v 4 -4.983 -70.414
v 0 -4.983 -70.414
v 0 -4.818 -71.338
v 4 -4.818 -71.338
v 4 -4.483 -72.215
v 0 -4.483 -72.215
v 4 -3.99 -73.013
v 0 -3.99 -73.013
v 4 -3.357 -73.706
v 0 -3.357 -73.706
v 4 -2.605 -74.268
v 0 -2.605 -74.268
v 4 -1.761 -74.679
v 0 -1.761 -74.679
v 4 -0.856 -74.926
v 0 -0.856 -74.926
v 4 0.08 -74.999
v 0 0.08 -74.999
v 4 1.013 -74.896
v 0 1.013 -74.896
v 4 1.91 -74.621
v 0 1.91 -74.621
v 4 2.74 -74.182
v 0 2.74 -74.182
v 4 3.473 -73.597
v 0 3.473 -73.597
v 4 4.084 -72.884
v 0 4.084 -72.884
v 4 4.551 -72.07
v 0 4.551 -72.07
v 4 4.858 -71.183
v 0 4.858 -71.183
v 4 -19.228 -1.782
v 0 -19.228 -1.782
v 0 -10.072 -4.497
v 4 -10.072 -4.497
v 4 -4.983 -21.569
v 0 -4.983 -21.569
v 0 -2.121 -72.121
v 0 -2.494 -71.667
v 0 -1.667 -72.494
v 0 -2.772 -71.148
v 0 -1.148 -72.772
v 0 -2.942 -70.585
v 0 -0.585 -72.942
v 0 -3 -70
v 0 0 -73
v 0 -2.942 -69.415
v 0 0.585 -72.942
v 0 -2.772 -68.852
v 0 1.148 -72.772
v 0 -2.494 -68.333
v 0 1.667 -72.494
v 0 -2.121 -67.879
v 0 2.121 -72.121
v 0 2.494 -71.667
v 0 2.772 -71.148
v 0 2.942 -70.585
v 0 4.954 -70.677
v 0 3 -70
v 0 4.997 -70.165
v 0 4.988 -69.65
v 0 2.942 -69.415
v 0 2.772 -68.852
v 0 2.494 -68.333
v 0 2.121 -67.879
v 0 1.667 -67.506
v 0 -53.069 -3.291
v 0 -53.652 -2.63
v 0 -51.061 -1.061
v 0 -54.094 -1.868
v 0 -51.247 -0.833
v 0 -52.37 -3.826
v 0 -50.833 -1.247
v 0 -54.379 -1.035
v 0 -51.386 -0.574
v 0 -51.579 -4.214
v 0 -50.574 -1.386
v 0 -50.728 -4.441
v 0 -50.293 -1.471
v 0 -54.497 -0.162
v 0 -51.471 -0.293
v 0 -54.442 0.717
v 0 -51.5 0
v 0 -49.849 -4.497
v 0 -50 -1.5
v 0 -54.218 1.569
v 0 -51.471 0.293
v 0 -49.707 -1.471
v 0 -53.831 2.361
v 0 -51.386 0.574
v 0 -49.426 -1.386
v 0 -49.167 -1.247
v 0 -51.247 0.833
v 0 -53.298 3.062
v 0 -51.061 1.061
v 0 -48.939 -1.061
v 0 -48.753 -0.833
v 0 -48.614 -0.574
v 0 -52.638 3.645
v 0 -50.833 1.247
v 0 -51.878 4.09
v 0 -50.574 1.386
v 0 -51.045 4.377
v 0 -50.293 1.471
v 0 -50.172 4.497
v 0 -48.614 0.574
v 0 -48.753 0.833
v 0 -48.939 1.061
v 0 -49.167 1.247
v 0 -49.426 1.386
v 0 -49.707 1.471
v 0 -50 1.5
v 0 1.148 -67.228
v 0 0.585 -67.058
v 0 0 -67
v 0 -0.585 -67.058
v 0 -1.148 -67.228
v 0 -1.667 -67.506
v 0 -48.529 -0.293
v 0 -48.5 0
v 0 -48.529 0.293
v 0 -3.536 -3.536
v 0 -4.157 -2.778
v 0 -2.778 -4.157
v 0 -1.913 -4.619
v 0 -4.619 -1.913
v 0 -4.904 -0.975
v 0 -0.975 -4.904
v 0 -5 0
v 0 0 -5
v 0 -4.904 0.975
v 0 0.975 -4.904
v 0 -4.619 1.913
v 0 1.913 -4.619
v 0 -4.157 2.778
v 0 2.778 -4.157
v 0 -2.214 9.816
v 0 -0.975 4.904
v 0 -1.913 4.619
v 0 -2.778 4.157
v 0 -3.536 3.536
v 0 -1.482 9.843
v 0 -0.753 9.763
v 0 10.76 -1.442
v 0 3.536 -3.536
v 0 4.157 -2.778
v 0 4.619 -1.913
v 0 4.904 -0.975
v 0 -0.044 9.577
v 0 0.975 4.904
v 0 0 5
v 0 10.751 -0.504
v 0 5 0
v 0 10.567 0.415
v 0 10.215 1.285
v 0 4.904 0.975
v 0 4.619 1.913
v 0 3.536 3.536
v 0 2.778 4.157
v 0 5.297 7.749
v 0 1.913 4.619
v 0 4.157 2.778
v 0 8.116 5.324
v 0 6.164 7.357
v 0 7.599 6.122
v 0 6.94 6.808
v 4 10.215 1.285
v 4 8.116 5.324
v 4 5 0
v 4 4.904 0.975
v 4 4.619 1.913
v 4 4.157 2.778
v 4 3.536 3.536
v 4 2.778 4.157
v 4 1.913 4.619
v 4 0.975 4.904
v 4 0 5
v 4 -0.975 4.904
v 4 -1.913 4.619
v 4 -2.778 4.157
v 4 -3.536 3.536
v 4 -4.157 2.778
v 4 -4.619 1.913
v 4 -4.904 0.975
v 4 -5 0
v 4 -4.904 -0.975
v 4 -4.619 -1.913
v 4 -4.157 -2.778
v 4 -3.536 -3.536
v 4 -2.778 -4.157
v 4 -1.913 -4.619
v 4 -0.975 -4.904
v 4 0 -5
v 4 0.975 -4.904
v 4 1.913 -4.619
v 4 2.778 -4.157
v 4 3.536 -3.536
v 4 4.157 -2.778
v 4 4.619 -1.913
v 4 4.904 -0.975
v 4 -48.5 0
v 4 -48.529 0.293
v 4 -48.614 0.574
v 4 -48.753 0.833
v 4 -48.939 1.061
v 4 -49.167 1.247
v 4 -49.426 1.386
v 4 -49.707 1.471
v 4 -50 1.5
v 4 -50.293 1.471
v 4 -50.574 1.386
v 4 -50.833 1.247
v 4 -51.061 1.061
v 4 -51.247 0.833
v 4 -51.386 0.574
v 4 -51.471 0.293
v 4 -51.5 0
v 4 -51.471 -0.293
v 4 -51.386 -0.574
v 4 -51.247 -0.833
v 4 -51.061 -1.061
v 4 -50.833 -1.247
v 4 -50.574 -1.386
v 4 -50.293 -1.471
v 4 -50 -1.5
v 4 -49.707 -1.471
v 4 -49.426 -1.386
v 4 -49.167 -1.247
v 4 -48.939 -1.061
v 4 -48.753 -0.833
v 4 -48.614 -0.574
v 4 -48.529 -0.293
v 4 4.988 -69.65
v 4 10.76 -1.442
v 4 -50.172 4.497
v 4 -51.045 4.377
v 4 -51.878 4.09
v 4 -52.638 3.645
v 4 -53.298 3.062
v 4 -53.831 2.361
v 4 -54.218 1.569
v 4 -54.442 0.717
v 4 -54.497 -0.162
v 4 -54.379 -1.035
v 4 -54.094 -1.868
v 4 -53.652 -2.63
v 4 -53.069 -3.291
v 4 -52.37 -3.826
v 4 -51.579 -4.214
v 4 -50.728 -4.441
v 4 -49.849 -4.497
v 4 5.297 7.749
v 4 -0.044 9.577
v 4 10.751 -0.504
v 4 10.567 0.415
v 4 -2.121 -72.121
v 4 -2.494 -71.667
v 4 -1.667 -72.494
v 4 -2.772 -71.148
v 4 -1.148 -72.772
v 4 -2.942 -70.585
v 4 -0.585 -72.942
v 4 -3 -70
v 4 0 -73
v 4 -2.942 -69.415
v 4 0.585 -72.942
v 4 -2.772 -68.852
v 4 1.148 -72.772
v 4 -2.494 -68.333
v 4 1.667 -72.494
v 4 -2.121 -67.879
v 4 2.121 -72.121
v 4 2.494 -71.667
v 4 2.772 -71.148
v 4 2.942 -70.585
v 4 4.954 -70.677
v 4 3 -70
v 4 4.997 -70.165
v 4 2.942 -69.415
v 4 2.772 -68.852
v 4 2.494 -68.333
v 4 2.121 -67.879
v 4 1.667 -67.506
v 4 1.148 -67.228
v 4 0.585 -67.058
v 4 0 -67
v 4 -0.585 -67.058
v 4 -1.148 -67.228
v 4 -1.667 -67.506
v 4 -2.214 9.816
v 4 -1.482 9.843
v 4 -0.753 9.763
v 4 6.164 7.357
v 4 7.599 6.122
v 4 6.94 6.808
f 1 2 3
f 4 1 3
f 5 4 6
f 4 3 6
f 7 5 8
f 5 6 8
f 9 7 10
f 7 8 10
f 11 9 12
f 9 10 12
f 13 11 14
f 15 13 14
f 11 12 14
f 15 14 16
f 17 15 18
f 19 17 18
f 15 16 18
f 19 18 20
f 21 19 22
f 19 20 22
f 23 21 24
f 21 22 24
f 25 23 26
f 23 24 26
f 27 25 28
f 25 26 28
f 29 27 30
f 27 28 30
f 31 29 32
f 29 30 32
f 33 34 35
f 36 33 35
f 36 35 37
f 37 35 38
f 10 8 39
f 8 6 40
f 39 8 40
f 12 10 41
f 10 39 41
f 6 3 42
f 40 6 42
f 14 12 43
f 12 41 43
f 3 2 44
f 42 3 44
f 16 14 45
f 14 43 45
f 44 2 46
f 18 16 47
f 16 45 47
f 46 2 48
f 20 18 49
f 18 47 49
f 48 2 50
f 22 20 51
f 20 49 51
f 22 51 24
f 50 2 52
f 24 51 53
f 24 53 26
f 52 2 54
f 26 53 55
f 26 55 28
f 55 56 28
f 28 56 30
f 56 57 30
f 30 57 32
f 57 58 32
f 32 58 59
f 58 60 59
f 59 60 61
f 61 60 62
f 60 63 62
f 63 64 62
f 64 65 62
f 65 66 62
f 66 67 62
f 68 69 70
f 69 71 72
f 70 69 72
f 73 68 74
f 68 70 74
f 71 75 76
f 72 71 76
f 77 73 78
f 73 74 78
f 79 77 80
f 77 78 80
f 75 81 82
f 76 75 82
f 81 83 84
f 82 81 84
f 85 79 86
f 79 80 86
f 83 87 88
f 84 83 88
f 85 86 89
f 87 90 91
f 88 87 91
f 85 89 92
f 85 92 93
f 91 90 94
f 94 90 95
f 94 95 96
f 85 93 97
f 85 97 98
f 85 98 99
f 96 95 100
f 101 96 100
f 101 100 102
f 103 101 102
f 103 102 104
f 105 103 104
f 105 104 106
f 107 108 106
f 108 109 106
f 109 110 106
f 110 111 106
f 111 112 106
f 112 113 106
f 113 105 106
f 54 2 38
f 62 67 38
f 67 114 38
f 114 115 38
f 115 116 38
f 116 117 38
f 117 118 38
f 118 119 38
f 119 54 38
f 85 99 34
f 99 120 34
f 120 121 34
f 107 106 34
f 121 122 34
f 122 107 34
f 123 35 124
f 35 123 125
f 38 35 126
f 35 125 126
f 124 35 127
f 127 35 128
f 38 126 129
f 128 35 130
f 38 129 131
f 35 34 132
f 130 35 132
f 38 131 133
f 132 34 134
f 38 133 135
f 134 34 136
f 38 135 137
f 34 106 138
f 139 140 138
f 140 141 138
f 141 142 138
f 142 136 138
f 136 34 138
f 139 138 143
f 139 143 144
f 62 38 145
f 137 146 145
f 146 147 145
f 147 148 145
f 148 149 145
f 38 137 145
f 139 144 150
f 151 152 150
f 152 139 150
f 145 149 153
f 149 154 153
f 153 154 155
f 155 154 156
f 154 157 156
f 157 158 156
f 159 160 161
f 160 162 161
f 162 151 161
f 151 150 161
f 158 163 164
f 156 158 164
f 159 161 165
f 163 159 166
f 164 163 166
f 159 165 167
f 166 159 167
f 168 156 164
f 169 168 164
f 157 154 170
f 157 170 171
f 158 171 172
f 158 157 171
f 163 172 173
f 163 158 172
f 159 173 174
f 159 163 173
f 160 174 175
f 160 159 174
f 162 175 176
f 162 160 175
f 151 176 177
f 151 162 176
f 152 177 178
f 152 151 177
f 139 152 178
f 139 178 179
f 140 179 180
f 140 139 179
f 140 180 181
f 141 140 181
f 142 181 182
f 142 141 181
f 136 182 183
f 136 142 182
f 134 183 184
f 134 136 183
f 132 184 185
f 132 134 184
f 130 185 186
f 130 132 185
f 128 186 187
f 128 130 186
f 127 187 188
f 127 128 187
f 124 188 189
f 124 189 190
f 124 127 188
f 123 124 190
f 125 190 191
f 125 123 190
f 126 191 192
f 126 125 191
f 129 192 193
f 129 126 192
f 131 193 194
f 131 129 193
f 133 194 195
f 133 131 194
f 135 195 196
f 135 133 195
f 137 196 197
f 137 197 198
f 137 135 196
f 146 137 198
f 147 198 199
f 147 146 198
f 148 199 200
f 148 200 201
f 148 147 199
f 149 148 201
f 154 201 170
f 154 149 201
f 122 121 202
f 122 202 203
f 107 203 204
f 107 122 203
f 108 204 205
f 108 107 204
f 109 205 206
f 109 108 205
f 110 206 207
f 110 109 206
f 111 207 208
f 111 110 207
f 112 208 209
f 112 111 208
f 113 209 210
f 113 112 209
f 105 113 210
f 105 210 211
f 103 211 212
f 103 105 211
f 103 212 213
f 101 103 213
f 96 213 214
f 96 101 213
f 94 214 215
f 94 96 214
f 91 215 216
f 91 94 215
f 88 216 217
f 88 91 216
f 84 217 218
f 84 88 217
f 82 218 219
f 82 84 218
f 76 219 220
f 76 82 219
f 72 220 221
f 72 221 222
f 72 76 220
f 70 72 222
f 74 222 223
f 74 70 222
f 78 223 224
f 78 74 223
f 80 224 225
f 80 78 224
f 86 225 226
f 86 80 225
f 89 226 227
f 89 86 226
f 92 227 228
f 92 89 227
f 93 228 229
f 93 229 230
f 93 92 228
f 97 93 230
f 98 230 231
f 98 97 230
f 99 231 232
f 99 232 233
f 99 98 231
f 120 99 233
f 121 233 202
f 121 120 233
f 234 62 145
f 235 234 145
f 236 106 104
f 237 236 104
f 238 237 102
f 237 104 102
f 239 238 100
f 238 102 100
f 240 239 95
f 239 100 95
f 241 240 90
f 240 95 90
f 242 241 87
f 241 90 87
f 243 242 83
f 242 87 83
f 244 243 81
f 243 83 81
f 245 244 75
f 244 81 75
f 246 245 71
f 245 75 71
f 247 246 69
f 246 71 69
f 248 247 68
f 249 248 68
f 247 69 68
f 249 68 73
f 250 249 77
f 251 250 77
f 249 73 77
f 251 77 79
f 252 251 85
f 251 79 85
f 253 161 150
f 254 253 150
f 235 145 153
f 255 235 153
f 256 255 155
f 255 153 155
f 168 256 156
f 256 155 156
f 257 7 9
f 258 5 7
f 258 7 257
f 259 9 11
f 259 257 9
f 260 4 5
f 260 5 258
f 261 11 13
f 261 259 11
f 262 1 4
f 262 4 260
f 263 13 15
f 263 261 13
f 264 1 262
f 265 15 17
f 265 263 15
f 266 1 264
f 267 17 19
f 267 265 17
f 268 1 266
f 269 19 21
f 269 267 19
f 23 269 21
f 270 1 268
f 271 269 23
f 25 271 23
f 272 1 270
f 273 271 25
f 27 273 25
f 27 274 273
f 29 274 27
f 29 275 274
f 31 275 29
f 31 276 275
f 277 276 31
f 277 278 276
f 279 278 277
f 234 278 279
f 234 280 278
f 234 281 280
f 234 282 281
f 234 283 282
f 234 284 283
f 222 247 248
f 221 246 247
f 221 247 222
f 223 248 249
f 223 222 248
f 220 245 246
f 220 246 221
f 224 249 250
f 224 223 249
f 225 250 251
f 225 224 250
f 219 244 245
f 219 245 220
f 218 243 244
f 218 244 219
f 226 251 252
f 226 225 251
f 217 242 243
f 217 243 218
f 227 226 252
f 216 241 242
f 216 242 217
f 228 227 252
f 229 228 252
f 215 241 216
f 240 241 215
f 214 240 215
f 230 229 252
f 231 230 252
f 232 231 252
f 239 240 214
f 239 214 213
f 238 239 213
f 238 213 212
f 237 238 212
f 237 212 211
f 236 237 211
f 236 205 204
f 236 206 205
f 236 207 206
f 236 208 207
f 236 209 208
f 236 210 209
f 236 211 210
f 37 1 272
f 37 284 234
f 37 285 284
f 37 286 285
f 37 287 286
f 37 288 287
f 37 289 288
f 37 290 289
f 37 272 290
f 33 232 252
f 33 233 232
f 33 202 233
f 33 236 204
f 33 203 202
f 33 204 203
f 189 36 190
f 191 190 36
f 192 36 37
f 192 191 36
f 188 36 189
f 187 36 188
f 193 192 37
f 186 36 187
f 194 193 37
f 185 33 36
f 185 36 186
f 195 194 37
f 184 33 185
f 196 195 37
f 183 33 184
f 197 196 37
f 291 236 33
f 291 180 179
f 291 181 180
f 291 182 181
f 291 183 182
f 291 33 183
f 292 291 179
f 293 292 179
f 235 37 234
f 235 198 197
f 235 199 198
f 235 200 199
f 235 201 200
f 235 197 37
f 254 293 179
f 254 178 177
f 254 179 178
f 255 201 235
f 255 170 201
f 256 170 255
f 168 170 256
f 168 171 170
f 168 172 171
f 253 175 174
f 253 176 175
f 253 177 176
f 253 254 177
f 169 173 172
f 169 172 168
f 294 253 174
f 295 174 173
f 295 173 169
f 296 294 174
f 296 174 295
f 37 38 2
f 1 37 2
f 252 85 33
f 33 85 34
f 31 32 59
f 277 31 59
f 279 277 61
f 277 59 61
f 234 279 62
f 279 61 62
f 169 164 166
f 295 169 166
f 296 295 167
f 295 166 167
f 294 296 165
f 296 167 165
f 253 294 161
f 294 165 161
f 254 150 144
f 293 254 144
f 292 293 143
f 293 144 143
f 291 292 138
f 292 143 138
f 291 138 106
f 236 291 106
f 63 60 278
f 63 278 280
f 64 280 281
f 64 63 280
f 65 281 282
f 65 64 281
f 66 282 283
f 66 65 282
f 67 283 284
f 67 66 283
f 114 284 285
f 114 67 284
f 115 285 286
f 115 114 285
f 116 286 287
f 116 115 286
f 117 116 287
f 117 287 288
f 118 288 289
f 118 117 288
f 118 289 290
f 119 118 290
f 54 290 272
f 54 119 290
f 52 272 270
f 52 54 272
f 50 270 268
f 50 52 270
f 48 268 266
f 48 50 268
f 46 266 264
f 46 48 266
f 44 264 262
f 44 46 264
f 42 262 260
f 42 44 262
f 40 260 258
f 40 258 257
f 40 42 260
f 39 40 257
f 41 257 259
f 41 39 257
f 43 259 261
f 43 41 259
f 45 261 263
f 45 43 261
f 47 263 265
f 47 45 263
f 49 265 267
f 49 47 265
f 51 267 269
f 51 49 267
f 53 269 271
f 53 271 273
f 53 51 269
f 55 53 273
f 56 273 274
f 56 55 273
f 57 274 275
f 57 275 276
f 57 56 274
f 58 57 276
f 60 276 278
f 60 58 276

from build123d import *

# Parameters (mm, degrees)
F0_R     = 3
F0_R_2   = 1.5
F0_R_3   = 5
F1_DEPTH = 4


with BuildPart() as f1:
    # F0 (on Right) → F1 (new body)
    with BuildSketch(Plane.YZ):
        with BuildLine():
            Line((-2.213923, 9.815771), (-50.172412, 4.496696))
            ThreePointArc((-50.172412, 4.496696), (-54.497093, -0.161719), (-49.848975, -4.497465))
            Line((-49.848975, -4.497465), (-19.228159, -1.781642))
            Line((-19.228159, -1.781642), (-10.071731, -4.497465))
            Line((-10.071731, -4.497465), (-4.982847, -21.569444))
            Line((-4.982847, -21.569444), (-4.982847, -70.413808))
            ThreePointArc((-4.982847, -70.413808), (-0.389649, -74.984794), (4.858025, -71.183044))
            Line((4.858025, -71.183044), (4.987747, -69.650171))
            Line((4.987747, -69.650171), (10.759941, -1.442462))
            ThreePointArc((10.759941, -1.442462), (10.680656, -0.04027), (10.214546, 1.284557))
            Line((10.214546, 1.284557), (8.115582, 5.324077))
            ThreePointArc((8.115582, 5.324077), (6.940309, 6.808469), (5.297374, 7.749453))
            Line((5.297374, 7.749453), (-0.044164, 9.577011))
            ThreePointArc((-0.044164, 9.577011), (-1.115855, 9.816243), (-2.213923, 9.815771))
        make_face()
        with Locations((0, -70)):
            Circle(F0_R, mode=Mode.SUBTRACT)
        with Locations((-50, 0)):
            Circle(F0_R_2, mode=Mode.SUBTRACT)
        Circle(F0_R_3, mode=Mode.SUBTRACT)
        with BuildLine():
            Line((4.987747, -69.650171), (4.858025, -71.183044))
            ThreePointArc((4.858025, -71.183044), (4.982191, -70.421626), (4.987747, -69.650171))
        make_face()
    extrude(amount=F1_DEPTH)


solid = f1.part
